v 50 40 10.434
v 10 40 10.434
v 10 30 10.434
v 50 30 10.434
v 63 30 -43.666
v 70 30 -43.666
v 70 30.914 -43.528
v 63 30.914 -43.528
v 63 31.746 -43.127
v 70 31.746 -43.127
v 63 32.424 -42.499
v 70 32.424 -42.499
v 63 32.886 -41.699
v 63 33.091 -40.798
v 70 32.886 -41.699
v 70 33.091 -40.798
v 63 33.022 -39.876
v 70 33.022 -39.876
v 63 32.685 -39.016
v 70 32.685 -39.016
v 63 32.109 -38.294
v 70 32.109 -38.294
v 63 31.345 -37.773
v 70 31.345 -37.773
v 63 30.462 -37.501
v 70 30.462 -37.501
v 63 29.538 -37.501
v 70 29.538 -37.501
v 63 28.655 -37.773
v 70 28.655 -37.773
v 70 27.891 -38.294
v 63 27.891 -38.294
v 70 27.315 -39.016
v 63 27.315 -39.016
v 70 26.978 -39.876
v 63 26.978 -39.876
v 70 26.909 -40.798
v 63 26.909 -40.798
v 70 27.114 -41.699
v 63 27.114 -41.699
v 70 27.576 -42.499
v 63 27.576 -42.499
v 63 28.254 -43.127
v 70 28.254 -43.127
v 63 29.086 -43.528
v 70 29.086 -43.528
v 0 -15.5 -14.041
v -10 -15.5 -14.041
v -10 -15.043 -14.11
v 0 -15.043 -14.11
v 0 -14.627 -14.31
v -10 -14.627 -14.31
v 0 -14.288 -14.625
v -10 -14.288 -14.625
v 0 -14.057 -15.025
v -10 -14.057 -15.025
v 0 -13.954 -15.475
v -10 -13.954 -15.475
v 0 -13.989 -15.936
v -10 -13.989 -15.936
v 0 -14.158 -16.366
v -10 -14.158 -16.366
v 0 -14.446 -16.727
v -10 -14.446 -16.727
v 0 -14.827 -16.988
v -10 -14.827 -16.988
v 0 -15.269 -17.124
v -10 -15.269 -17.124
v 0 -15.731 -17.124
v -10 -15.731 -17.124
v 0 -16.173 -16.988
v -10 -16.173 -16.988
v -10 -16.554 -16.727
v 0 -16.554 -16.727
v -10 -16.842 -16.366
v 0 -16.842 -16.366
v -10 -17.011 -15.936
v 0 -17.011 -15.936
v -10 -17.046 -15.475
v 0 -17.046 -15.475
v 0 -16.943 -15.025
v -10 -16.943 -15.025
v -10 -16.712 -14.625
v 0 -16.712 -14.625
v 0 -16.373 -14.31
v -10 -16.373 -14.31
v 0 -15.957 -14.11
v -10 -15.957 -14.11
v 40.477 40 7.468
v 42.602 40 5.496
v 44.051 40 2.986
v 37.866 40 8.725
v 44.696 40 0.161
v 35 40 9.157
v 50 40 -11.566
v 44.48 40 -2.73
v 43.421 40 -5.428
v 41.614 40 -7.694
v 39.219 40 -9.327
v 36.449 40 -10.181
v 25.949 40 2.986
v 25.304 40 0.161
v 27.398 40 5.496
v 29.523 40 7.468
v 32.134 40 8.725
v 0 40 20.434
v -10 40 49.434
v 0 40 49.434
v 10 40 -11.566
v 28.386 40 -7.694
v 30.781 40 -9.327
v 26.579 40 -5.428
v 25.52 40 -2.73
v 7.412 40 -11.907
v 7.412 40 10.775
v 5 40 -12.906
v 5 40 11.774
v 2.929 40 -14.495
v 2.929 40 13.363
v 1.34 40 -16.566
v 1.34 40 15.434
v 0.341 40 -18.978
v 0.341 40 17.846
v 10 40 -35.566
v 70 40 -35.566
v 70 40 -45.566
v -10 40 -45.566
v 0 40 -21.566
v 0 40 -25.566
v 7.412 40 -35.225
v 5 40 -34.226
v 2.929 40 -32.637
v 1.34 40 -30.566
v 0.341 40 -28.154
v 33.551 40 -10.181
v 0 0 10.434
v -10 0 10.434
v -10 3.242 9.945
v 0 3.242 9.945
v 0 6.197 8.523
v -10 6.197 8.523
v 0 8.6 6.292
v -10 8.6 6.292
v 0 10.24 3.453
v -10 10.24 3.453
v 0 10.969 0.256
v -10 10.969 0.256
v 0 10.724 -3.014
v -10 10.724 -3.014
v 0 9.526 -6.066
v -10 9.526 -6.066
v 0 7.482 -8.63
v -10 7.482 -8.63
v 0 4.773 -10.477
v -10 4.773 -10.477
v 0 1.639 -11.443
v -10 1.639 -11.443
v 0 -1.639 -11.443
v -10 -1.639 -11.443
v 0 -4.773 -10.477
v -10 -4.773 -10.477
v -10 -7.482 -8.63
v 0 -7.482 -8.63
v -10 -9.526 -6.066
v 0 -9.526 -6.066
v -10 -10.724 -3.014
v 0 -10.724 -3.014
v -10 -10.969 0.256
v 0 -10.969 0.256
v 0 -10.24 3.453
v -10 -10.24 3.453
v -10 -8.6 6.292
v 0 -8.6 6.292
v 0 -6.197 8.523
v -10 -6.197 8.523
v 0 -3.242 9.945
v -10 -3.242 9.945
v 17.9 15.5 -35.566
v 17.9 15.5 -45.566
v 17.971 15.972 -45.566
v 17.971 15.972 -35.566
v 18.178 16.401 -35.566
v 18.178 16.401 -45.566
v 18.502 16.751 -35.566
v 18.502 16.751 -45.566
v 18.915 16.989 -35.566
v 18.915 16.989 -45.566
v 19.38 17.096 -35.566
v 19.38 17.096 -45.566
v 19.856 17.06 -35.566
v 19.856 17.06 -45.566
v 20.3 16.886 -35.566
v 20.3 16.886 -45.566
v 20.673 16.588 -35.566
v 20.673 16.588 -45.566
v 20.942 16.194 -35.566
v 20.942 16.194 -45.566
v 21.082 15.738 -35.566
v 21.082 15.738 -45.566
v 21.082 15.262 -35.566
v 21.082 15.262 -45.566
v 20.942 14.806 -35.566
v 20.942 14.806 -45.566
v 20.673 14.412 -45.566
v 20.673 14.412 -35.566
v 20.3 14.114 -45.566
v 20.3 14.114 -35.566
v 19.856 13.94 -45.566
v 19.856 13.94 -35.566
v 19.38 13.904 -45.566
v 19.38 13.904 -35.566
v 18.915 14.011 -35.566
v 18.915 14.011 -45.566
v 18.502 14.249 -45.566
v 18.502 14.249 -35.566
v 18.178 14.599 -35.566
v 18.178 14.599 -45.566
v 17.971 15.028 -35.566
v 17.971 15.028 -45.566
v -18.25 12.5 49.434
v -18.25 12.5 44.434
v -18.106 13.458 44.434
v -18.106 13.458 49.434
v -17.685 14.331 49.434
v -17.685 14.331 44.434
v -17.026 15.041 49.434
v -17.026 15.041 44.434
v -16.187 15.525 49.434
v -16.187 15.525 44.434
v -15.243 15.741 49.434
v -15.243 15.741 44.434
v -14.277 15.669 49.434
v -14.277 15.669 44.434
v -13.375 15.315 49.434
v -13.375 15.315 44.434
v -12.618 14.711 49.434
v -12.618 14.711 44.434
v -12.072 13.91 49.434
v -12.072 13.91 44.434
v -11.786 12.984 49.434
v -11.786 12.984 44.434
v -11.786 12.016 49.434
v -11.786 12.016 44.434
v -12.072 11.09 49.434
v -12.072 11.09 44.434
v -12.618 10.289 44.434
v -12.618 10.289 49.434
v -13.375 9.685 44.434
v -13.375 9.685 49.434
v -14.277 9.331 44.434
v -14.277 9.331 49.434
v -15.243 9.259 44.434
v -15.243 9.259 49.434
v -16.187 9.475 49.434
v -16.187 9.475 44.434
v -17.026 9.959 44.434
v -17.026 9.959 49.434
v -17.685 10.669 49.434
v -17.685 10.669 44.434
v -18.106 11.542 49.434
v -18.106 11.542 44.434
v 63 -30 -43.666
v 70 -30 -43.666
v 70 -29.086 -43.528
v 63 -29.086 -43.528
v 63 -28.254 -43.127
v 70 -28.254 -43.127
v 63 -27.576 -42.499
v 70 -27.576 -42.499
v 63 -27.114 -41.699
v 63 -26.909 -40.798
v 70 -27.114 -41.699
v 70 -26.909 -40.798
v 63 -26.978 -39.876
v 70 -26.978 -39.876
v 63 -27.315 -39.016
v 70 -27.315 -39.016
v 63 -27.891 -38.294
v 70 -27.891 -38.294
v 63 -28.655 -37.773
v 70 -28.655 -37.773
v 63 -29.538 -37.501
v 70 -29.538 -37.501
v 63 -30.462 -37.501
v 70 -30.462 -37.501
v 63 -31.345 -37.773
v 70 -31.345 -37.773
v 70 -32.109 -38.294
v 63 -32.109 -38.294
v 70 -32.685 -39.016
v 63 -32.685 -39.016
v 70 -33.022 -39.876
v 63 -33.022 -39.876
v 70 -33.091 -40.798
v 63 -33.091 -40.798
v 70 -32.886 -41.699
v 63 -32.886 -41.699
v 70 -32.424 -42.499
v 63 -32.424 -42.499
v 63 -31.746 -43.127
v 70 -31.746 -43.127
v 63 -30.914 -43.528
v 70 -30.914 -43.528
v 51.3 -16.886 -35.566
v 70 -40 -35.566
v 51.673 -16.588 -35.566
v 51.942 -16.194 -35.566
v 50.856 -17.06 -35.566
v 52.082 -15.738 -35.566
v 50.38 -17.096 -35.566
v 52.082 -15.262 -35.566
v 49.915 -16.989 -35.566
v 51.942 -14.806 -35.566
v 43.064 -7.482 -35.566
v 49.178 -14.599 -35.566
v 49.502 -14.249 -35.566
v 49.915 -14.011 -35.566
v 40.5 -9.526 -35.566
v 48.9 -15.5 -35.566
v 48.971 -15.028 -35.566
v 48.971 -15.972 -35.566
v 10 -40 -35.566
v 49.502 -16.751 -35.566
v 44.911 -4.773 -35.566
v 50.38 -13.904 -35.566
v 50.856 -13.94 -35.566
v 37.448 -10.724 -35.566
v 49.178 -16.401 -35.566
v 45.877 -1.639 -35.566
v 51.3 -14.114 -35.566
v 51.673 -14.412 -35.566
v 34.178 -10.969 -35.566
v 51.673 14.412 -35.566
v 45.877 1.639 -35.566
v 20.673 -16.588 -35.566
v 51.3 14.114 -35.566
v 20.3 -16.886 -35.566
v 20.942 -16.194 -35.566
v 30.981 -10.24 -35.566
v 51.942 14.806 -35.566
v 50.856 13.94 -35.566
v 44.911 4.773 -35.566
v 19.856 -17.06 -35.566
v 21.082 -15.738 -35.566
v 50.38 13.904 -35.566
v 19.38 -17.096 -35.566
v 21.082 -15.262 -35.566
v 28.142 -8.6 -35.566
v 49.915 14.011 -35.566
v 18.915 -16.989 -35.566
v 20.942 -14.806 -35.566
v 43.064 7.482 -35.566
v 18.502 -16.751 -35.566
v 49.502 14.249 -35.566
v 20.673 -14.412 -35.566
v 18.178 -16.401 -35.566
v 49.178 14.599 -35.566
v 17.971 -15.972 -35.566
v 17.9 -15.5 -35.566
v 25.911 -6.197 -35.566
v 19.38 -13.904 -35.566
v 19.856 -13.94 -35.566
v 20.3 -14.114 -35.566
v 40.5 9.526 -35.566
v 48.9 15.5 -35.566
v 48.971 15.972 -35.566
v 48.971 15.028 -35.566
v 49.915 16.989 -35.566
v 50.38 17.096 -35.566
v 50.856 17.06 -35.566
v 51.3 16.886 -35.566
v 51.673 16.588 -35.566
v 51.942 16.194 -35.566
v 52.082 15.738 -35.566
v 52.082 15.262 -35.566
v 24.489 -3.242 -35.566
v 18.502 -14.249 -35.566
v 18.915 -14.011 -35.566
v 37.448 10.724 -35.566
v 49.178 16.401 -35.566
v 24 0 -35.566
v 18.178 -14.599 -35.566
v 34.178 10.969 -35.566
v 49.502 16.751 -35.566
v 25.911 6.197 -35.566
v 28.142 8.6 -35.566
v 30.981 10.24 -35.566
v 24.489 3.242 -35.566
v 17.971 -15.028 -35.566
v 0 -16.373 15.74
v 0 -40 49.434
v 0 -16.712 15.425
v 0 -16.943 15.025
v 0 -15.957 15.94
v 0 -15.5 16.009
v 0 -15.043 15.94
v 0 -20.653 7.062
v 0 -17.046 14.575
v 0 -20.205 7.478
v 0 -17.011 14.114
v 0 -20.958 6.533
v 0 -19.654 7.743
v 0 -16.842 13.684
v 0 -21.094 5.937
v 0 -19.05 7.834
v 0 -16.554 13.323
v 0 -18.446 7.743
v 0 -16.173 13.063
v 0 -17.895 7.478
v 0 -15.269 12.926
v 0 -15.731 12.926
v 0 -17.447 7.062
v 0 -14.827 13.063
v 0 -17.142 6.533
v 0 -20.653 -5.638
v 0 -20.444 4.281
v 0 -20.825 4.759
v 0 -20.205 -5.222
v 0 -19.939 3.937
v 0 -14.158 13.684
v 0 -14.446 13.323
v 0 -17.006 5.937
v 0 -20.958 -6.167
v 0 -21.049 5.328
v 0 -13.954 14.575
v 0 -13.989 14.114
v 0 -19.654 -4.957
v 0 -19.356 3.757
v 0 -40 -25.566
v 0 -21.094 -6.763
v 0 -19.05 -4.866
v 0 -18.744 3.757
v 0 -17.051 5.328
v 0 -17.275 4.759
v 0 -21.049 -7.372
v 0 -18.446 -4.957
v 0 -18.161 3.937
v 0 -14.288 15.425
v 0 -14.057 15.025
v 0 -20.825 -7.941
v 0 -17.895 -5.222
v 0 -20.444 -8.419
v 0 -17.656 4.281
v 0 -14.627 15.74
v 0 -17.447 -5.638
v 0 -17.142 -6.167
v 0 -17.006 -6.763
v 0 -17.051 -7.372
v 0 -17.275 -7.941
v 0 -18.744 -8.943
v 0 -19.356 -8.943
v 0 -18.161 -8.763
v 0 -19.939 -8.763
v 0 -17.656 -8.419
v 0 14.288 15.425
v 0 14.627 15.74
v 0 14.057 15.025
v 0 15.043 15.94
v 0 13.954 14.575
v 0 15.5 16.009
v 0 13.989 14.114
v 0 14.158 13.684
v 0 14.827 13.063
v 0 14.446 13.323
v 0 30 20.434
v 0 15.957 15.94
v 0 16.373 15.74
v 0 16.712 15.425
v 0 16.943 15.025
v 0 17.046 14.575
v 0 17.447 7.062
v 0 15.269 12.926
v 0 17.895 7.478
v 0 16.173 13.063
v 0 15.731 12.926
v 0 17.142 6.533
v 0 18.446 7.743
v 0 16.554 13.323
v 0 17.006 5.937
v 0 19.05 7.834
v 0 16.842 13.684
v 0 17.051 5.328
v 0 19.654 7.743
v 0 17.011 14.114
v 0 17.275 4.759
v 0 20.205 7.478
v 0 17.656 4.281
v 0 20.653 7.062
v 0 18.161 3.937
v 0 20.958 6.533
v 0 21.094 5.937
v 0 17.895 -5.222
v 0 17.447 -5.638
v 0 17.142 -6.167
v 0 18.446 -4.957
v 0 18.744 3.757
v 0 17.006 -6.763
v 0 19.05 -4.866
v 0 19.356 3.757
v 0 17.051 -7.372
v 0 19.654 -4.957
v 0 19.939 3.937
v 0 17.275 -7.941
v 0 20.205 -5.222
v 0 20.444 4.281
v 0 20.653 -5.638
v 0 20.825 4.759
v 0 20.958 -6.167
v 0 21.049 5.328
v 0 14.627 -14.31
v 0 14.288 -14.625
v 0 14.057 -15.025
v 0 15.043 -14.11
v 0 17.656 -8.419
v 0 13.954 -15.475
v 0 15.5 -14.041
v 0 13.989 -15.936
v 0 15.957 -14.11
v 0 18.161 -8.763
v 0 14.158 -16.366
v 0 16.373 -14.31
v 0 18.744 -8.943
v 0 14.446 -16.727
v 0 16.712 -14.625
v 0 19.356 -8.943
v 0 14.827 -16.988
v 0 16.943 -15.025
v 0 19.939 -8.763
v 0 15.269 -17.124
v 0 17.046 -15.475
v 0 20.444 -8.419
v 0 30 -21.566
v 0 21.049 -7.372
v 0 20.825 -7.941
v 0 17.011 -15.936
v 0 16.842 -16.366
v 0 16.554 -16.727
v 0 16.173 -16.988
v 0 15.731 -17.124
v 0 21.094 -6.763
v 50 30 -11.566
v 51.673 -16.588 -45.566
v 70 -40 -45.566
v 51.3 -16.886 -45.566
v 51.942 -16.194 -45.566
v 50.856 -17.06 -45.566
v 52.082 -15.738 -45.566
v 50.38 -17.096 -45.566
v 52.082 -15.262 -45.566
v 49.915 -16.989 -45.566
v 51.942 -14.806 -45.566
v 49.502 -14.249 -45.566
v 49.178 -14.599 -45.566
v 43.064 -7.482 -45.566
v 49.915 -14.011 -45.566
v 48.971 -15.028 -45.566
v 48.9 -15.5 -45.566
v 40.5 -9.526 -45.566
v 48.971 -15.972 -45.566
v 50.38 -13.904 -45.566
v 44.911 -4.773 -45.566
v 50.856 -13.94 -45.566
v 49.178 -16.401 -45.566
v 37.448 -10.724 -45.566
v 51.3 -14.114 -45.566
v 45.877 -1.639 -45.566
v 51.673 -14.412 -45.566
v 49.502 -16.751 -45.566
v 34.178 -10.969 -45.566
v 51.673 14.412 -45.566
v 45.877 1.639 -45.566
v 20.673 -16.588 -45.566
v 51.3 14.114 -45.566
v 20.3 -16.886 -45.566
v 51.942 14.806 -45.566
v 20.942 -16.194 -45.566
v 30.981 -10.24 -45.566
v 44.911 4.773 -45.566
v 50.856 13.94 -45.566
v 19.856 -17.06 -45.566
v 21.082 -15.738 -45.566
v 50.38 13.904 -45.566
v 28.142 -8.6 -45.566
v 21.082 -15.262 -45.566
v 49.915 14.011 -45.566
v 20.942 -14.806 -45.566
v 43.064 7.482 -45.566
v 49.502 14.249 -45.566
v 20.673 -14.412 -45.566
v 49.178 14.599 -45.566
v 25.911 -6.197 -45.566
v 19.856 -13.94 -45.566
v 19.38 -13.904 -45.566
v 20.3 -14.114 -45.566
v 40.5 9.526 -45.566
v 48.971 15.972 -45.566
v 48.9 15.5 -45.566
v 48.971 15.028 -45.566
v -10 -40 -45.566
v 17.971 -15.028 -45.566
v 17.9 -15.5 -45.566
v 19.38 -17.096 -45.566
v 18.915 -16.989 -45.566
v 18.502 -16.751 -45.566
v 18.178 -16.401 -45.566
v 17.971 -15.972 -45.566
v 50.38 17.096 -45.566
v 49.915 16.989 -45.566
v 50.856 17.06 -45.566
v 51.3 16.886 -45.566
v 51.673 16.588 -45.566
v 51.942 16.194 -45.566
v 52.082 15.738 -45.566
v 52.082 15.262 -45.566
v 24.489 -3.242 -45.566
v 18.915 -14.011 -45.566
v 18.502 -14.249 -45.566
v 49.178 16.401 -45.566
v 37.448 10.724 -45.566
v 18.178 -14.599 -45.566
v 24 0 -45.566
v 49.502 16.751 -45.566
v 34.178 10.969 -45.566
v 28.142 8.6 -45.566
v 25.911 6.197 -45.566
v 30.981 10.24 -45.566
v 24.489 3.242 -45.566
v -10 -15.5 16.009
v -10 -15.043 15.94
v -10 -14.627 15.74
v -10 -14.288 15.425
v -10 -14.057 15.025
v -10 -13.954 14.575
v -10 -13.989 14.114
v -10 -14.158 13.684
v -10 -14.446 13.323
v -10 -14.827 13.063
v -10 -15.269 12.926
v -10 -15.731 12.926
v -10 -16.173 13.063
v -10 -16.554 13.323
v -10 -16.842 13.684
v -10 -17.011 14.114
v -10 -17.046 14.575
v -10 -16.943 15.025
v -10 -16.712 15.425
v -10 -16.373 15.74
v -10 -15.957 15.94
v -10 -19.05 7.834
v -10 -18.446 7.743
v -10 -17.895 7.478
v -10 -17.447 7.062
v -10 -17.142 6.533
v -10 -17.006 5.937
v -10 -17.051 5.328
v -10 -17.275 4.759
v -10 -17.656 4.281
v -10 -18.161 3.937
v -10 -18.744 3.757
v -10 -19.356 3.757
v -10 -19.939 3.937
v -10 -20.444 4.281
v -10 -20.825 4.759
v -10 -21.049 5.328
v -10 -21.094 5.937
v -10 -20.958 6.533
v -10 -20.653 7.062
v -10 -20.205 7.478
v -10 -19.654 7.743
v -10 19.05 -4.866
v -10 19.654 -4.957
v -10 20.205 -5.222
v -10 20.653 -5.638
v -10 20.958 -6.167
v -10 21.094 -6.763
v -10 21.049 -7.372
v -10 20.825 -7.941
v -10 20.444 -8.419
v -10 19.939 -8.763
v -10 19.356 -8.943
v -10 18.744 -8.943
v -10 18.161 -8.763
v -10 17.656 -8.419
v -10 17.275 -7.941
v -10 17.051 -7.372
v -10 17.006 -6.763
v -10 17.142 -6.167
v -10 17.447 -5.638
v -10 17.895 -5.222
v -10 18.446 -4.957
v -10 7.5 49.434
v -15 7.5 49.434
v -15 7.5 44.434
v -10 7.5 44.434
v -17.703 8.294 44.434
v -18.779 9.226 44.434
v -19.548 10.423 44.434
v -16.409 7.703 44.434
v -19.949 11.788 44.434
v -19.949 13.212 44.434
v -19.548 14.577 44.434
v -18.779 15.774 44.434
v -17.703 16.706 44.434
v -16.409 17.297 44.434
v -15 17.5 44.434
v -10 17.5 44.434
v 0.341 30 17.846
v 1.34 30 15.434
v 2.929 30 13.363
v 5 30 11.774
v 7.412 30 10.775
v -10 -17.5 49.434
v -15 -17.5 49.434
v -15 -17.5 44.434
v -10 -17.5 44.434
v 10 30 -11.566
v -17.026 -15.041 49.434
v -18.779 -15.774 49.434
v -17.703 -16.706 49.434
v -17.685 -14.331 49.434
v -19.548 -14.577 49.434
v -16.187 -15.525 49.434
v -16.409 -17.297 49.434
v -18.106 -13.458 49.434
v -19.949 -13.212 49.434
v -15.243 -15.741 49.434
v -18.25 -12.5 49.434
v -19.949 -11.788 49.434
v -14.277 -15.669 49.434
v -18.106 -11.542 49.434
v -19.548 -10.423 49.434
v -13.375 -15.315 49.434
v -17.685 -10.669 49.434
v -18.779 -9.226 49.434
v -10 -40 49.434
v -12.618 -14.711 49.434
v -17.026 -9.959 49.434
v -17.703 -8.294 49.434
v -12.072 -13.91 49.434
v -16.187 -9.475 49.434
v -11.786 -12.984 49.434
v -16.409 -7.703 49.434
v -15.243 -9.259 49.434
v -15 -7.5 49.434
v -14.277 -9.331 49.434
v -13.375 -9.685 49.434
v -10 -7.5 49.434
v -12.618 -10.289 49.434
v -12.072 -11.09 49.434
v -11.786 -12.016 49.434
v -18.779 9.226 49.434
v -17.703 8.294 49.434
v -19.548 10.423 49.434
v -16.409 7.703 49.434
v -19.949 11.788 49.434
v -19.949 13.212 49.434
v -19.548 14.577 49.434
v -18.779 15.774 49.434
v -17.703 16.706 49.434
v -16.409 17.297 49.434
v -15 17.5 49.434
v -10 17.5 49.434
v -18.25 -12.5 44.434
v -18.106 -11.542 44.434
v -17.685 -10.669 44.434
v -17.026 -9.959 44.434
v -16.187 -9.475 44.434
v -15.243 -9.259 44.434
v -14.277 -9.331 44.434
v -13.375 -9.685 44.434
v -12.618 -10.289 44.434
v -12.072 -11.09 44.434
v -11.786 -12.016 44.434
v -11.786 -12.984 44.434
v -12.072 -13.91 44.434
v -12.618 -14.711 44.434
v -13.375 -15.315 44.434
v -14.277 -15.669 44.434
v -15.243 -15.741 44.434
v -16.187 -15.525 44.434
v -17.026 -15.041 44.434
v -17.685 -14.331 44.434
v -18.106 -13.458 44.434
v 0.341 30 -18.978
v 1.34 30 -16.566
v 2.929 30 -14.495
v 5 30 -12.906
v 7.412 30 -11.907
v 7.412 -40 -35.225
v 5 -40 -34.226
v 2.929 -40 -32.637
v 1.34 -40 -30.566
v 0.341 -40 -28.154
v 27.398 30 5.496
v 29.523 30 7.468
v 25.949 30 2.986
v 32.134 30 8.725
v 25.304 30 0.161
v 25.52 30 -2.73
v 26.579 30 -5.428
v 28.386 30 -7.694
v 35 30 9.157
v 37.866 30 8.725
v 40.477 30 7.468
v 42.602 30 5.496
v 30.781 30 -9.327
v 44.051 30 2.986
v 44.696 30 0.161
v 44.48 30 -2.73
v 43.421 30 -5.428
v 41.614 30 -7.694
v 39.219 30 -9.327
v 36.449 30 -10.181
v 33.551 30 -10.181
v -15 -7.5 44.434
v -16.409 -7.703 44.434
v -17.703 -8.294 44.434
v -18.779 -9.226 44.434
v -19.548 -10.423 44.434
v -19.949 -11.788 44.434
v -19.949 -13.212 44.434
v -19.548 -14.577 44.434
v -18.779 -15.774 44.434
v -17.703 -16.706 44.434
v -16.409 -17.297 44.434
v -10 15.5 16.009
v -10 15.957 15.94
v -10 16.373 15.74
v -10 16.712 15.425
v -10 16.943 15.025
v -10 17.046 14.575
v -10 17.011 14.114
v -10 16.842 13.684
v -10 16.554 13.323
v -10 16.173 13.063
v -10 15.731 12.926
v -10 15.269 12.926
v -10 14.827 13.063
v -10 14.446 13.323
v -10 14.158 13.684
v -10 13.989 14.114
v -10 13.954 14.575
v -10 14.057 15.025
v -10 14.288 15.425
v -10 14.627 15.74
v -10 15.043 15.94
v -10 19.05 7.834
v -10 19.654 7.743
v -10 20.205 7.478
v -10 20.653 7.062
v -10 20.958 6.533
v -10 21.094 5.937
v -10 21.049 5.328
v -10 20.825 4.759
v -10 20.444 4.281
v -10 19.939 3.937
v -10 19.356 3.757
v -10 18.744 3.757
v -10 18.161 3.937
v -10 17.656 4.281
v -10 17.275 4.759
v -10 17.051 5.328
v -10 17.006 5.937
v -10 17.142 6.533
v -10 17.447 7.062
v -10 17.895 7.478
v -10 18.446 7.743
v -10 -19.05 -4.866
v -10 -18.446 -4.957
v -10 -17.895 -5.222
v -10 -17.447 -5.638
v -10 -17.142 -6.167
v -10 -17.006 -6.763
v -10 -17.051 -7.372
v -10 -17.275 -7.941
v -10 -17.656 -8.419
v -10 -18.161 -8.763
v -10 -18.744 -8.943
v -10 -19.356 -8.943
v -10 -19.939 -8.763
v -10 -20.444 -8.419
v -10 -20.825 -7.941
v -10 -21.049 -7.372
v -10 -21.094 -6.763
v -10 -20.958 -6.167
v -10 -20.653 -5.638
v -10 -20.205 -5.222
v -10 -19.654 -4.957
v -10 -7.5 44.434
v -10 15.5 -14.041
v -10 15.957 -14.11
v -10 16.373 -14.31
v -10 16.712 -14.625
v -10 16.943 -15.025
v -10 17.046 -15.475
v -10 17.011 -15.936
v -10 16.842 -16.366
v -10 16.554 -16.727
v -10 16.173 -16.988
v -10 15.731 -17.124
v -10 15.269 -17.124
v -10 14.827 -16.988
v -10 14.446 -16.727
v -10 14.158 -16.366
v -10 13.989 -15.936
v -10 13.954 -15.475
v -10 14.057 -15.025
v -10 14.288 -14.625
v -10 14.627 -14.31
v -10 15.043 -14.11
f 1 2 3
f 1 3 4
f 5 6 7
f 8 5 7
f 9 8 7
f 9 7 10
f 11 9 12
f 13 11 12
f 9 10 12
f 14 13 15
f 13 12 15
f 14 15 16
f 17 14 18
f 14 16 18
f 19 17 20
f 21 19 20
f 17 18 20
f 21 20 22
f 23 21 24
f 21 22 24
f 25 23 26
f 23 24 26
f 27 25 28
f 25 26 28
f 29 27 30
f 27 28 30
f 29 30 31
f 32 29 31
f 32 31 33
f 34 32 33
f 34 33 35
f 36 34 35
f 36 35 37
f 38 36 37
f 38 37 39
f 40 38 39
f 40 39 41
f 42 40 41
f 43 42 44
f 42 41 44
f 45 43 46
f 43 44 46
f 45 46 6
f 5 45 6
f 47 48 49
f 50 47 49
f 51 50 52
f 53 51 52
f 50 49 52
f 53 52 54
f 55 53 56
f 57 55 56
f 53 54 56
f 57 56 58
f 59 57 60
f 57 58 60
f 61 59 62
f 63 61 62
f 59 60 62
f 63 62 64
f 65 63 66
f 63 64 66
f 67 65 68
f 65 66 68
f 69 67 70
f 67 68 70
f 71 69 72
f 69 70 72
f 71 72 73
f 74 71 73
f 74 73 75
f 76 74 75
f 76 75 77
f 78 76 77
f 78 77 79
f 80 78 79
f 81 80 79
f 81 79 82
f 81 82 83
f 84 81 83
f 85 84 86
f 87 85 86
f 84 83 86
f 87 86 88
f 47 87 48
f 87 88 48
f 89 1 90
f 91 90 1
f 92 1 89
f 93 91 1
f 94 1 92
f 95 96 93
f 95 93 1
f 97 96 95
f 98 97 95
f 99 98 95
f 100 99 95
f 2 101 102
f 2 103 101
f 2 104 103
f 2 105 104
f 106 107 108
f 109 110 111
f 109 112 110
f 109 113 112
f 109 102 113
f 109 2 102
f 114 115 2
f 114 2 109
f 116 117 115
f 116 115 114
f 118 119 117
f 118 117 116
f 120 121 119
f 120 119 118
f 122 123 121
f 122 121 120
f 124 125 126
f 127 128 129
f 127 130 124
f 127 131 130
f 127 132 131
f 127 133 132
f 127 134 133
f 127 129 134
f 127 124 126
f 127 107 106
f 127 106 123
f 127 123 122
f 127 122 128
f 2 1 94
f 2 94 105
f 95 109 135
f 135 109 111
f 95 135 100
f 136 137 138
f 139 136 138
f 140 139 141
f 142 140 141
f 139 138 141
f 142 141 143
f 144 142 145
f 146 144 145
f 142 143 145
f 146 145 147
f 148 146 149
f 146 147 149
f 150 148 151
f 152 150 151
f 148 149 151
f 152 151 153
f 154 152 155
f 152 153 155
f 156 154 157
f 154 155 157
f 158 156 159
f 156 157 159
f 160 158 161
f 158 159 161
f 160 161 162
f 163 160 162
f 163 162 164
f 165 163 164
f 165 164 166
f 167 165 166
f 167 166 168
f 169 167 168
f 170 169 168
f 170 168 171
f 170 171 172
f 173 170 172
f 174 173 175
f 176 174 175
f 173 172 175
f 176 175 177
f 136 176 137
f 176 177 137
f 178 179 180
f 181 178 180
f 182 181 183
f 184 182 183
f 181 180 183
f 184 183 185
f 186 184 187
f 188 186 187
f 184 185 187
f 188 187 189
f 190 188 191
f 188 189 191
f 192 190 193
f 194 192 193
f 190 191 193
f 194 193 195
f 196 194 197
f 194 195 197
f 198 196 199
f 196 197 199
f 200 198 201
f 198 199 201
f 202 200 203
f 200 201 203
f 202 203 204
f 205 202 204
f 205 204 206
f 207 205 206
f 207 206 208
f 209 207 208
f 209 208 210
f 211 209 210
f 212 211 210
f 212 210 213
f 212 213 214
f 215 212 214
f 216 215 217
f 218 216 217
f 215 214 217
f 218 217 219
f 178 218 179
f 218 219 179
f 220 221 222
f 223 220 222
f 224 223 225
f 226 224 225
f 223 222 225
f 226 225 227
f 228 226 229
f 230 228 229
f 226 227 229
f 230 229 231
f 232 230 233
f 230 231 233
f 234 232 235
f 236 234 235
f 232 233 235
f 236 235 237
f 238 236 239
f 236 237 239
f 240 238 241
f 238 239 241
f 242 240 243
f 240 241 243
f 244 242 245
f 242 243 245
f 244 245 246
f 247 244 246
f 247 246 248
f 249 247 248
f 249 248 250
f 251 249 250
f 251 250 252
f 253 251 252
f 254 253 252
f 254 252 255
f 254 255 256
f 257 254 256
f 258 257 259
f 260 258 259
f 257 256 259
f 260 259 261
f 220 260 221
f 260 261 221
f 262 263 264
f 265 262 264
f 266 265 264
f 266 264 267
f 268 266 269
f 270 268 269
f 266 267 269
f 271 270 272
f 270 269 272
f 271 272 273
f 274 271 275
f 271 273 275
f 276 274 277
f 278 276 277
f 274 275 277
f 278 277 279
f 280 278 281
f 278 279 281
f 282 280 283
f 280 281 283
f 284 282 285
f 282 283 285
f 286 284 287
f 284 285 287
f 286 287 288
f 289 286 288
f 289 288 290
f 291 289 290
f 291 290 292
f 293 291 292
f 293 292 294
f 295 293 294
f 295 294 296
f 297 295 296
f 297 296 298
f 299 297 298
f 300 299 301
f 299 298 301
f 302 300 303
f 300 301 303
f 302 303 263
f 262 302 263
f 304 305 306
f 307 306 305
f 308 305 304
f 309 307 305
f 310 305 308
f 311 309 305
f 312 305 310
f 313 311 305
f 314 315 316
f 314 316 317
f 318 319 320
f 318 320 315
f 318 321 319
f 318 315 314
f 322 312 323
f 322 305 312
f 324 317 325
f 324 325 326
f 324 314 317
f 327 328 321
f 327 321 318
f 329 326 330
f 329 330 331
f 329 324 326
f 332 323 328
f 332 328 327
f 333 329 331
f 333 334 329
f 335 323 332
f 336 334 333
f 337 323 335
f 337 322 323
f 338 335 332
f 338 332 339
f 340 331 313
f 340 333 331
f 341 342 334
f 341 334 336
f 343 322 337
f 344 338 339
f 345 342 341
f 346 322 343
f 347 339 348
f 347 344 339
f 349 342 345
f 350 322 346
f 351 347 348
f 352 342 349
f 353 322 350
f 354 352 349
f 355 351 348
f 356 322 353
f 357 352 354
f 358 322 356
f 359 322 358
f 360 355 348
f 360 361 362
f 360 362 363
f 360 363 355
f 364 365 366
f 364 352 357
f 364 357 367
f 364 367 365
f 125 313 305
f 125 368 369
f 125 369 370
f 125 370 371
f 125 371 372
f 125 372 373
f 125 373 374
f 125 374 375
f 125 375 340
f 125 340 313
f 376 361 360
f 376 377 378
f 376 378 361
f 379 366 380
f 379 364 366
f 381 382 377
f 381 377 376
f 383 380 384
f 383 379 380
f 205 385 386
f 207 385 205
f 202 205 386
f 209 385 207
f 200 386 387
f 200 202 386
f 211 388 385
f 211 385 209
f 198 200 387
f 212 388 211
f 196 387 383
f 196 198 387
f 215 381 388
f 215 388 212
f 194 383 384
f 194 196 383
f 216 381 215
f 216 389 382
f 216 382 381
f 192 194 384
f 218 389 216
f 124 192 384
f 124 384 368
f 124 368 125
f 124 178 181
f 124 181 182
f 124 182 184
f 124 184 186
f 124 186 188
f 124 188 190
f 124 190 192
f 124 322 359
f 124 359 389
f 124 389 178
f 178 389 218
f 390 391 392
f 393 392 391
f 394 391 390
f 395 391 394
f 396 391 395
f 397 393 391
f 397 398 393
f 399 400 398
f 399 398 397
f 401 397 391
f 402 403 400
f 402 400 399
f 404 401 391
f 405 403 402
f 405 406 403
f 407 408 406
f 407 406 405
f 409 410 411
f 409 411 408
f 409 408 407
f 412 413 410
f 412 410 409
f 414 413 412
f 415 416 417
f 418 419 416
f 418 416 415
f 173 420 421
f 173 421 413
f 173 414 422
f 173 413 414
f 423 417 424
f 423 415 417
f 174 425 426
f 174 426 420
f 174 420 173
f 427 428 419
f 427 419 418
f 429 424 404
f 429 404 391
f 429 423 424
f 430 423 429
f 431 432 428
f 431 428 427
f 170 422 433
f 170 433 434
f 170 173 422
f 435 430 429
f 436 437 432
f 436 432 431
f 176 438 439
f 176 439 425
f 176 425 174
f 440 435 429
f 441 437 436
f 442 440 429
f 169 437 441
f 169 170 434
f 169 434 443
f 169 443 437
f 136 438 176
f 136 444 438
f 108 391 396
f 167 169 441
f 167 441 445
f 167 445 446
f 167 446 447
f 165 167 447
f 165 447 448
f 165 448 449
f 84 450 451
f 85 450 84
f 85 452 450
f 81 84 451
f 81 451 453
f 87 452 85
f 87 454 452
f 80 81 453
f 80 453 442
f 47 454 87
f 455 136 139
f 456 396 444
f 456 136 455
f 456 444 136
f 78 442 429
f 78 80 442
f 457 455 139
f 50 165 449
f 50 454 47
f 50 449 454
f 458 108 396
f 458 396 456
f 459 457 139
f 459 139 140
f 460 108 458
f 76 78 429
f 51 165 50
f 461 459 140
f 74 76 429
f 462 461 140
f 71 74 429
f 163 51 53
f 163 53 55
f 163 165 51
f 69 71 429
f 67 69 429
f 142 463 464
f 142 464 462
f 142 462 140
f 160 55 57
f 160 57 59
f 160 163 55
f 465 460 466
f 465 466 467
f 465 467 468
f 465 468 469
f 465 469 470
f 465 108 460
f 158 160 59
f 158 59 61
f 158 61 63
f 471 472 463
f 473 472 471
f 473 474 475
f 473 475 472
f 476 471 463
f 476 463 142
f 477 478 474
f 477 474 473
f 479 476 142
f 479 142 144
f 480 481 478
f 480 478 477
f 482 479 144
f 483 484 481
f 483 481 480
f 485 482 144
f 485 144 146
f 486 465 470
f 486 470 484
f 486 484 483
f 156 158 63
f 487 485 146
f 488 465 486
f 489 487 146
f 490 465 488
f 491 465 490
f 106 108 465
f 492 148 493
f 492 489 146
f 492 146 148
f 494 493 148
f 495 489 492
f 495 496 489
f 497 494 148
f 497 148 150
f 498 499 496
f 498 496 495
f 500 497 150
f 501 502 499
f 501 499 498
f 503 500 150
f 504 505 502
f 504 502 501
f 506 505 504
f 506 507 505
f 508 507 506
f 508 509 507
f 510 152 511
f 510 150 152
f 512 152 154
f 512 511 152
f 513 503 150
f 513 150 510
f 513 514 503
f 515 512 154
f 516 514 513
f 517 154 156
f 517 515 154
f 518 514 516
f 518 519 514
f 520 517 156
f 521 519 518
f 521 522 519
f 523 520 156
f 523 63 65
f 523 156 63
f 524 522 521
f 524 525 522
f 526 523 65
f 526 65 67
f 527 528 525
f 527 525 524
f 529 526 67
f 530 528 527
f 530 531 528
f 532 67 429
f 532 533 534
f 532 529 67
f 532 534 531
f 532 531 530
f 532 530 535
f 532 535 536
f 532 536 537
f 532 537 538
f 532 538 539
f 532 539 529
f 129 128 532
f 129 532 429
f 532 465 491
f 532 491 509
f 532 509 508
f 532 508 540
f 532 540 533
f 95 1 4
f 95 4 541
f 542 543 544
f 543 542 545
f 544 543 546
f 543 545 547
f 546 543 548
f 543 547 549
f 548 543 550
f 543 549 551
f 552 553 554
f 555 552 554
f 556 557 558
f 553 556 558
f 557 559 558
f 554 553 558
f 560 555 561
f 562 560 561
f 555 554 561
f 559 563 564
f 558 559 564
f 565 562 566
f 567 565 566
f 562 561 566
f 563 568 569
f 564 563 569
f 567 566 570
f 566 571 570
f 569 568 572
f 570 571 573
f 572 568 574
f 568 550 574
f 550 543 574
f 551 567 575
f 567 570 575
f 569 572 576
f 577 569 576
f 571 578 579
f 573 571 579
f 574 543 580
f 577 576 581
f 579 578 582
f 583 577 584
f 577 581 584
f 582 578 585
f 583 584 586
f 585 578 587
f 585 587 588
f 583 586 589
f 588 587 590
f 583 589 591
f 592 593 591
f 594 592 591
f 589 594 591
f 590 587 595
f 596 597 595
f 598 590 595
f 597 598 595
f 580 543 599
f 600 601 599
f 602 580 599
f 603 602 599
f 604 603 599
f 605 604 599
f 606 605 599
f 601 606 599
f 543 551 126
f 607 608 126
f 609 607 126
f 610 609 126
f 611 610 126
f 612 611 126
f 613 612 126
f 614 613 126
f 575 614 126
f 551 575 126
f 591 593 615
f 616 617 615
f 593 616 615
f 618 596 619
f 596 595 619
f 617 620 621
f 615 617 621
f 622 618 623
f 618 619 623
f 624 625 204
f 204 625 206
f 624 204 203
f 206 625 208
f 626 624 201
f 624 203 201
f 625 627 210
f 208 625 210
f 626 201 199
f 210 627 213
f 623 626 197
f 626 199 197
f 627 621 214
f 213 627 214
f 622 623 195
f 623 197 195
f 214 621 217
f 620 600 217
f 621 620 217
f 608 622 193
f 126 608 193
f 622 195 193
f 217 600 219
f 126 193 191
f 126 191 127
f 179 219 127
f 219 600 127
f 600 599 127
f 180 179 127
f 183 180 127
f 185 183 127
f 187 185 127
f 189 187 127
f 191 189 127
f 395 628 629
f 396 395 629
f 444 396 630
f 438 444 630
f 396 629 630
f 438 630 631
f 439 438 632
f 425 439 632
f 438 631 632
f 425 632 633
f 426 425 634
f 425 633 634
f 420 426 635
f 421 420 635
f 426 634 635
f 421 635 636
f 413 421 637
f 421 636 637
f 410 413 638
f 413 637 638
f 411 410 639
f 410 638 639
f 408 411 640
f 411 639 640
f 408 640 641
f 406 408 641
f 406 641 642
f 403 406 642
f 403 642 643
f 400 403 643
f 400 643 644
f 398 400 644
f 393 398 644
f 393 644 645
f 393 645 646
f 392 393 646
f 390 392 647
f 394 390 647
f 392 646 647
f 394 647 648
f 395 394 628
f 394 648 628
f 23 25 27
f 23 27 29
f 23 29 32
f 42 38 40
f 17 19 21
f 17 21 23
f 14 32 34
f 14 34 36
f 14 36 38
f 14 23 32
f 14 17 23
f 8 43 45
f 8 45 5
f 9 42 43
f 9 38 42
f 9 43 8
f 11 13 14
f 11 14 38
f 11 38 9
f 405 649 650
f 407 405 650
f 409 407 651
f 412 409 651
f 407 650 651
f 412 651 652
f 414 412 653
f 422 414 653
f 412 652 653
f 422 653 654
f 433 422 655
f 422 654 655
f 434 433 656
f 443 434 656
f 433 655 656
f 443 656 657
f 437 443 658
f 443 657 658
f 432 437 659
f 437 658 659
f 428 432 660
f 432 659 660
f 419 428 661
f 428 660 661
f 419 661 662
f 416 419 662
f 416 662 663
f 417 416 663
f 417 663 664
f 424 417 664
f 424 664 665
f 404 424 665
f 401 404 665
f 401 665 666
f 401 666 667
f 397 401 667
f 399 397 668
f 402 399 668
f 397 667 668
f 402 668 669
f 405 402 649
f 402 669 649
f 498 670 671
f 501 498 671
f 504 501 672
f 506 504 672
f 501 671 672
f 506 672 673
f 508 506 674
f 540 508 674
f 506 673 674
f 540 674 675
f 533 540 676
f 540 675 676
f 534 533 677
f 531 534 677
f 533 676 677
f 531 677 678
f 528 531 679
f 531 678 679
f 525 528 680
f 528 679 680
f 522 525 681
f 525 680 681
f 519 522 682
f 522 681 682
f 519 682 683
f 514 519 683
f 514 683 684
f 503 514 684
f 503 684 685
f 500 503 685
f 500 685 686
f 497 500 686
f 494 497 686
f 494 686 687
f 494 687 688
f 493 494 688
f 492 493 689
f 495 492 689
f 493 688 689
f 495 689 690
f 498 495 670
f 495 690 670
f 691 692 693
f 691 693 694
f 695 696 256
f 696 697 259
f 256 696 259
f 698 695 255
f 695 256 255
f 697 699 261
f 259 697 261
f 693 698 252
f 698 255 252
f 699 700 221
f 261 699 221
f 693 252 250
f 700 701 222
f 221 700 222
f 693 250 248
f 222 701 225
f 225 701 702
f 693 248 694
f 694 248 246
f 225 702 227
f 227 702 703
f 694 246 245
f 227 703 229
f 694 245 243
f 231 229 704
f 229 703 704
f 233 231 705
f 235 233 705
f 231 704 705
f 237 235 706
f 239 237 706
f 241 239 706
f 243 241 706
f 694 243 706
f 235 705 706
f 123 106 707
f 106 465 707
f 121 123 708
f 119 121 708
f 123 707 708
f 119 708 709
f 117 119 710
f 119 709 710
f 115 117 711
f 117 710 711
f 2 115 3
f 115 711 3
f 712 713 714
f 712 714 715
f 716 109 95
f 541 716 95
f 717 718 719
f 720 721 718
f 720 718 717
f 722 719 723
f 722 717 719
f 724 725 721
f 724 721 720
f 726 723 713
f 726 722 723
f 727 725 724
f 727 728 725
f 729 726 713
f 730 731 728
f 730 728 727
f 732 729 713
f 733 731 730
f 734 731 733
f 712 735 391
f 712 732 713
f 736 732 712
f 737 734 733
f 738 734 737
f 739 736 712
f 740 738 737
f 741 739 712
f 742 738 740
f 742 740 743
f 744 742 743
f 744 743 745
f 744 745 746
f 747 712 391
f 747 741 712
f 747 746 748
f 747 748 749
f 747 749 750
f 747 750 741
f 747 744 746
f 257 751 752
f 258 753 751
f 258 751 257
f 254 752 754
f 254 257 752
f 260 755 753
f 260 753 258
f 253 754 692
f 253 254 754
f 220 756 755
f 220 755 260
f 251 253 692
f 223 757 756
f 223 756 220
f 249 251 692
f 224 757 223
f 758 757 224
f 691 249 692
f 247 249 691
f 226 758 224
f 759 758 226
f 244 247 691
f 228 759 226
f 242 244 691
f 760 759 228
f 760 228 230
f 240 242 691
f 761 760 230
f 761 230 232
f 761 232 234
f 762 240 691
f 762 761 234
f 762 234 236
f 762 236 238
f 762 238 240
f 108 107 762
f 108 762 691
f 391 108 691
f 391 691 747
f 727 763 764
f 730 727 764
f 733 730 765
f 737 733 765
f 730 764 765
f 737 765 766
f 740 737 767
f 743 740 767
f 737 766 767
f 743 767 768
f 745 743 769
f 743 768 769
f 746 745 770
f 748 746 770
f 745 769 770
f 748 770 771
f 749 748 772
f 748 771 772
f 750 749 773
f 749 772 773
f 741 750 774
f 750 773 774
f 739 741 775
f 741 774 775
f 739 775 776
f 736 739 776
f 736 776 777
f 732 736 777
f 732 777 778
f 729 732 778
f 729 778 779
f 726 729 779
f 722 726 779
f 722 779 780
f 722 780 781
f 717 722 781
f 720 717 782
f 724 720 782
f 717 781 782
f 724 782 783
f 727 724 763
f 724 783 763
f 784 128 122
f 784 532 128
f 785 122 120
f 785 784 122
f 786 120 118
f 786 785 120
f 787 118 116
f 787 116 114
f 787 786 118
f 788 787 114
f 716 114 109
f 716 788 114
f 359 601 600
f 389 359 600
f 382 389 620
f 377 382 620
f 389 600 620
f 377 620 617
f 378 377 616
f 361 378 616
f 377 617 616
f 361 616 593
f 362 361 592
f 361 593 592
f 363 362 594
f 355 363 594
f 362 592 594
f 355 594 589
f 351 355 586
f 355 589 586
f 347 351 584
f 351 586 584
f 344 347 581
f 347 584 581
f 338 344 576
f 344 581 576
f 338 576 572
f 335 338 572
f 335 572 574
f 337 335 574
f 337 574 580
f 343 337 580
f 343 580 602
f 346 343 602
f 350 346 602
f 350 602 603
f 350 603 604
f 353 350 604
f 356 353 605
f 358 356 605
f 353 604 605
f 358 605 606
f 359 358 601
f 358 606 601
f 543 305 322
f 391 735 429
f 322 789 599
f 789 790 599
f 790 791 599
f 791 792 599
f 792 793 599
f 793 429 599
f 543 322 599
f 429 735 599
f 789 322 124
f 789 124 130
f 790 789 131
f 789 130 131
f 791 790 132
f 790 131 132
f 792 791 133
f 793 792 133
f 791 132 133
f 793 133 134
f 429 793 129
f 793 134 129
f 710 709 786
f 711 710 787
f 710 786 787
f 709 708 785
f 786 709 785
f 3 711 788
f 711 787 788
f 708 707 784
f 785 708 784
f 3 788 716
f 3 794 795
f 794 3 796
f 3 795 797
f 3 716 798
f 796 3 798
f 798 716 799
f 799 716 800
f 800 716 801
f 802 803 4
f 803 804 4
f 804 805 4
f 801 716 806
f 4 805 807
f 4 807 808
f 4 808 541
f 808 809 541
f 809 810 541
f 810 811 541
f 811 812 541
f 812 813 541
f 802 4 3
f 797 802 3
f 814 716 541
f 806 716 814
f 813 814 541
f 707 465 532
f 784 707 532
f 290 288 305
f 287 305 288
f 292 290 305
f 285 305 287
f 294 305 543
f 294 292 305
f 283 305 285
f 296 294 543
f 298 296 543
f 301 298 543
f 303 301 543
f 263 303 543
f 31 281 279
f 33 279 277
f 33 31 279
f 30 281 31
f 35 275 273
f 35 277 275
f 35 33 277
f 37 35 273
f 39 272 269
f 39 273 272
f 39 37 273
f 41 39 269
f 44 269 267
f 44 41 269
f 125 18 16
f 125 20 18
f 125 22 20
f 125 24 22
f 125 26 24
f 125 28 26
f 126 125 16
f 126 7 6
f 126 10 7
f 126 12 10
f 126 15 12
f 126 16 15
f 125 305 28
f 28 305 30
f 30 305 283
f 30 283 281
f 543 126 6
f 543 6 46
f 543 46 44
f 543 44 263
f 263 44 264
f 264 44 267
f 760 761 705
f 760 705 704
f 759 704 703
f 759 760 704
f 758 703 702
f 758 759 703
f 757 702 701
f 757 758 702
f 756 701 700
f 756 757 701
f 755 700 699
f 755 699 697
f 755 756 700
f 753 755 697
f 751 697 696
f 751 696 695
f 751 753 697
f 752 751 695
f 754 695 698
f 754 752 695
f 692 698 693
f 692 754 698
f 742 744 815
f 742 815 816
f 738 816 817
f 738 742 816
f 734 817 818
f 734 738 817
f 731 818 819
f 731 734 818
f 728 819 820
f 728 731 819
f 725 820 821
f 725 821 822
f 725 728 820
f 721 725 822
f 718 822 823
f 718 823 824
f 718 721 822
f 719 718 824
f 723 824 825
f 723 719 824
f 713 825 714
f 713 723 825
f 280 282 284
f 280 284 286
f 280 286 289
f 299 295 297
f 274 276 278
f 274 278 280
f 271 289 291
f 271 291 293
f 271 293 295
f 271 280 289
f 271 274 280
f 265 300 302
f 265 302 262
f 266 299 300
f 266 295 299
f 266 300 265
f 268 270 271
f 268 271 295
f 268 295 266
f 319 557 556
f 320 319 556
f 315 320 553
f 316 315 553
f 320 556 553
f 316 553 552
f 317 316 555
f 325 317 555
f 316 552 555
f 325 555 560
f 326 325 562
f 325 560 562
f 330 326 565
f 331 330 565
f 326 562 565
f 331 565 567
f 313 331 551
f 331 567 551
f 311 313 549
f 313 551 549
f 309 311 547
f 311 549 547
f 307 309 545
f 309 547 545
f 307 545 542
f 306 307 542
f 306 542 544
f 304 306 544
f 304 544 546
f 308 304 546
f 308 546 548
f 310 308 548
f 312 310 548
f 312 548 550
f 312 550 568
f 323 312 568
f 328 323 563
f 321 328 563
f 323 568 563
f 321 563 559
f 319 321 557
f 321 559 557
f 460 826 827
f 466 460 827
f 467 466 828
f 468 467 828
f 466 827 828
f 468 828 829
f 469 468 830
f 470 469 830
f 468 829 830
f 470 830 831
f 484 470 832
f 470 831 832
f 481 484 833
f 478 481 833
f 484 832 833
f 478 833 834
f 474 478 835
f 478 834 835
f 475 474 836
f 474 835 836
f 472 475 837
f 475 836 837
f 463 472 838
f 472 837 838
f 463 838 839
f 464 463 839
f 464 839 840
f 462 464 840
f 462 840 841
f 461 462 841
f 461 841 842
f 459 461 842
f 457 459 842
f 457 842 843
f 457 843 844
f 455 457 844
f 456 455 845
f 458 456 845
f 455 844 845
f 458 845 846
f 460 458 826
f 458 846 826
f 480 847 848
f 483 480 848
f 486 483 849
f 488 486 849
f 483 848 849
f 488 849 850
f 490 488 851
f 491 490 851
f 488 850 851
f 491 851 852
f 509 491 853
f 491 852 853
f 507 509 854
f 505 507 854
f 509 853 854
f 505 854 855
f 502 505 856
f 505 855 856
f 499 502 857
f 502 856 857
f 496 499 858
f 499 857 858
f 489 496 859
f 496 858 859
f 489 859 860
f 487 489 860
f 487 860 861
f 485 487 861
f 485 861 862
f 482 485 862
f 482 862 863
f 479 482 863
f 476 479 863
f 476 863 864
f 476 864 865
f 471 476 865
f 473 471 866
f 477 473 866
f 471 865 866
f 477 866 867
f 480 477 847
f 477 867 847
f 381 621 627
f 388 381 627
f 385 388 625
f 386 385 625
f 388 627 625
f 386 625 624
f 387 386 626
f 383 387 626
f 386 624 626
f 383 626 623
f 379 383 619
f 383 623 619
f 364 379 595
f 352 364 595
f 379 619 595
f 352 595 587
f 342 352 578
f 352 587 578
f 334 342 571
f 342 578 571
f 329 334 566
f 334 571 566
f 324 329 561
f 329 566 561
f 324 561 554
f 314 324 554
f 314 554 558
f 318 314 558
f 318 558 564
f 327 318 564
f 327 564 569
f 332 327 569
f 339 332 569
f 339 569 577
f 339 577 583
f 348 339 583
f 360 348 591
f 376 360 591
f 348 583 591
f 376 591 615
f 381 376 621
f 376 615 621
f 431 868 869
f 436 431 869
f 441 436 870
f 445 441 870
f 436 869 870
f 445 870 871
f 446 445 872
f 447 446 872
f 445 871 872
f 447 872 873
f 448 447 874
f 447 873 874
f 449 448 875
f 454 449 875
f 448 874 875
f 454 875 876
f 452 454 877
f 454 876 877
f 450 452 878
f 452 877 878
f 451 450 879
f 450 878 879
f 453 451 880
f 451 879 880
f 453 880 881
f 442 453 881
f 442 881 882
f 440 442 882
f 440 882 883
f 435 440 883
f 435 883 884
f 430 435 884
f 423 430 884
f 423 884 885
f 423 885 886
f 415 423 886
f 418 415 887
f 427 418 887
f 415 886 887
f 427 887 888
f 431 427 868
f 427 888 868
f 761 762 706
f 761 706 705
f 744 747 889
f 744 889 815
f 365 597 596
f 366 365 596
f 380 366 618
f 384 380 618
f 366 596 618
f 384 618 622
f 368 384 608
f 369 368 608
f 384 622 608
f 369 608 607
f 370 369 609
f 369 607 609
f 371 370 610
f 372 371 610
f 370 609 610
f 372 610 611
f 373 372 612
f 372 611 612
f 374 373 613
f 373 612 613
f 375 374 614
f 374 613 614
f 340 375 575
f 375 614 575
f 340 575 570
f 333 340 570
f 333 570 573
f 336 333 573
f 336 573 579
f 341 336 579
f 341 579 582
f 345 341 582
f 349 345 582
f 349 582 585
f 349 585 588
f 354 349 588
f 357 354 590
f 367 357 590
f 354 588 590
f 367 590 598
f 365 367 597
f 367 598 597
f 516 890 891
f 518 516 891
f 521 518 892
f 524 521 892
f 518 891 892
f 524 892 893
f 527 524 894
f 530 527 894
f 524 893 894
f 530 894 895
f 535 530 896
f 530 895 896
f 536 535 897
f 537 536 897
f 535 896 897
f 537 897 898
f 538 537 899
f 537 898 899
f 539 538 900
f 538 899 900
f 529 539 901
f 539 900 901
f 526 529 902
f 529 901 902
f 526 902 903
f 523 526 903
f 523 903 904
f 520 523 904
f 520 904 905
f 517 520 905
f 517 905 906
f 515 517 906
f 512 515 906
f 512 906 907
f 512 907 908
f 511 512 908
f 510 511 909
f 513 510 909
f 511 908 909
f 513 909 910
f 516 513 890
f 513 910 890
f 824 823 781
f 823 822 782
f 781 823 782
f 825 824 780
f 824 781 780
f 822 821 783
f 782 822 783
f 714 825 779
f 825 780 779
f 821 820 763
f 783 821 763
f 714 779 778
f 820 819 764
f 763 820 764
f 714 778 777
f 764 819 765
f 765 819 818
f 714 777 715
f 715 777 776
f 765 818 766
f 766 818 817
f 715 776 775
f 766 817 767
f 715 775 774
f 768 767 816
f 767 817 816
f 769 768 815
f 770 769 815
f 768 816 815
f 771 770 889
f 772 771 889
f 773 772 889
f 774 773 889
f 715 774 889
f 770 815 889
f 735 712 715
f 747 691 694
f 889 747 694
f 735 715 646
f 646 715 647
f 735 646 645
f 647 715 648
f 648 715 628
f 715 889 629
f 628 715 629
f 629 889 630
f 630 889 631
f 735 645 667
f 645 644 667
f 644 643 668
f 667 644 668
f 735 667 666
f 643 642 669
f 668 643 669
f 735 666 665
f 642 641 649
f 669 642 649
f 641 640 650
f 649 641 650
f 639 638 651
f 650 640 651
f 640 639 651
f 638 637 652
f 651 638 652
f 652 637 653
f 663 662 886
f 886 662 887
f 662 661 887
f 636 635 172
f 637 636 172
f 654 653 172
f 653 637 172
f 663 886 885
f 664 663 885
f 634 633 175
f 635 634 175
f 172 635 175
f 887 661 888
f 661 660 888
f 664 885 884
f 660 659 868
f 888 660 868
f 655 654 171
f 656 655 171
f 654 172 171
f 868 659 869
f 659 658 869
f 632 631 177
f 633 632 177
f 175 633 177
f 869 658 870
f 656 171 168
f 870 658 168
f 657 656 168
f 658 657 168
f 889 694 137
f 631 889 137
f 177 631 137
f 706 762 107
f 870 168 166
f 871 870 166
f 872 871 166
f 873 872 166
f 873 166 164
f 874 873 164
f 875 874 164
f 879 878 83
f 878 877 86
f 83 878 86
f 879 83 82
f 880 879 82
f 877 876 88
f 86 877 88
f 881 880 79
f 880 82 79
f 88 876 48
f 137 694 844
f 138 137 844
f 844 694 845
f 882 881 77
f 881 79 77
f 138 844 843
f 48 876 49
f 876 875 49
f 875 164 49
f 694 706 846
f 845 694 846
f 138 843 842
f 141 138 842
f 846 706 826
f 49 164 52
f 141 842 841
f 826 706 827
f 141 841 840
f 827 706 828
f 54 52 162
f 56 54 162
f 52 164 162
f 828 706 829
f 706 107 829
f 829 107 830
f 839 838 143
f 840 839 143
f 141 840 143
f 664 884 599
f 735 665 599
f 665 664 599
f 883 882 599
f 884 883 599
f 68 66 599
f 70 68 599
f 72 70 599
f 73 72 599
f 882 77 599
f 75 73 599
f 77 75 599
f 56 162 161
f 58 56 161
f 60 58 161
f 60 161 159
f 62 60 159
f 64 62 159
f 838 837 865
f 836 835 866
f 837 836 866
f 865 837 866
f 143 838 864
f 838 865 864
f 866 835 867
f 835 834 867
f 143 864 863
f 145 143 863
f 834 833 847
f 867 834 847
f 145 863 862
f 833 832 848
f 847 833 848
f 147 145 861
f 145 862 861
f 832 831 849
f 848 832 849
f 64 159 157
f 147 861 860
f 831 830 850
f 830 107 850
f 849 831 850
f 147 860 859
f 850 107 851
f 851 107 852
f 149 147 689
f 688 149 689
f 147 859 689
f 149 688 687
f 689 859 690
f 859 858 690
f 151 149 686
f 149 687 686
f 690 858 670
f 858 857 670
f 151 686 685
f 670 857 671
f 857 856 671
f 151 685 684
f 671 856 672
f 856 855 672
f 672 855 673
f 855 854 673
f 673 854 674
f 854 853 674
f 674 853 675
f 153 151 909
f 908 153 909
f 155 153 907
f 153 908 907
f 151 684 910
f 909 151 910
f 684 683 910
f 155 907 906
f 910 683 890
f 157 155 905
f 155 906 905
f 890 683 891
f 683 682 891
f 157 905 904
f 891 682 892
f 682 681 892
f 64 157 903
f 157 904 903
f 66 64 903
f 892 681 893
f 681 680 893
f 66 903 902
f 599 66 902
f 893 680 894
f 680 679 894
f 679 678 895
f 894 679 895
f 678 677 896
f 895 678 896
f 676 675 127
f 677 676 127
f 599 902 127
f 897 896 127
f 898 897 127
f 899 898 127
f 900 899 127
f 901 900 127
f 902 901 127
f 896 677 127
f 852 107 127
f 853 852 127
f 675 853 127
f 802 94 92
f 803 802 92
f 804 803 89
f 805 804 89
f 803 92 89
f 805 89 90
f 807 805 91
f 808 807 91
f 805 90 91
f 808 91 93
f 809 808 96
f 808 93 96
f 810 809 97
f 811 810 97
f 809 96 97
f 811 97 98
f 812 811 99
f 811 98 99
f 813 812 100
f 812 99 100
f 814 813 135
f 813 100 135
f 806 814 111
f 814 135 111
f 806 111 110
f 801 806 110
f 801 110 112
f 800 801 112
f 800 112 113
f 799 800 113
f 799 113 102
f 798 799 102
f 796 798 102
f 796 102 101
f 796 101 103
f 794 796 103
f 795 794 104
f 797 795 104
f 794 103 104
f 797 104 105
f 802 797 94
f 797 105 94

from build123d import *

# Parameters (mm, degrees)
SKETCH1_W               = 10
SKETCH1_H               = 95
BOSS_EXTRUDE1_DEPTH     = 40
SKETCH4_W               = 10
SKETCH4_H               = 80
BOSS_EXTRUDE3_DEPTH     = 70
SKETCH10_R              = 11
SKETCH10_R_2            = 1.6
CUT_EXTRUDE1_DEPTH      = 10
SKETCH2_R               = 11
SKETCH2_R_2             = 1.55
SKETCH2_R_3             = 2.05
CUT_EXTRUDE2_DEPTH      = 10
BOSS_EXTRUDE4_DEPTH     = 5
SKETCH15_R              = 3.25
CUT_EXTRUDE3_DEPTH      = 5
CROQUIS1_W              = 50
CROQUIS1_H              = 22
CROQUIS1_R              = 9.72345
SALIENTE_EXTRUIR1_DEPTH = 10
CROQUIS2_R              = 3.1
CORTAR_EXTRUIR1_DEPTH   = 7
REDONDEO1_R             = 10


with BuildPart() as part:
    # Sketch1 → Boss-Extrude1 (new, symmetric)
    with BuildSketch(Plane(origin=(0, 0, 0), x_dir=(1, 0, 0), z_dir=(0, 1, 0))):
        with Locations((-5, -1.933942264)):
            Rectangle(SKETCH1_W, SKETCH1_H)
    extrude(amount=BOSS_EXTRUDE1_DEPTH, both=True)

    # Sketch4 → Boss-Extrude3 (add)
    with BuildSketch(Plane(origin=(0, 0, 0), x_dir=(0, 0, -1), z_dir=(1, 0, 0))):
        with Locations((40.566057736, 0)):
            Rectangle(SKETCH4_W, SKETCH4_H)
    extrude(amount=BOSS_EXTRUDE3_DEPTH)

    # Sketch10 → Cut-Extrude1 (cut)
    with BuildSketch(Plane(origin=(0, 0, -45.566057736), x_dir=(-1, 0, 0), z_dir=(0, 0, -1))):
        with Locations((-35, 0)):
            Circle(SKETCH10_R)
        with Locations((-19.5, 15.5)):
            Circle(SKETCH10_R_2)
        with Locations((-50.5, 15.5)):
            Circle(SKETCH10_R_2)
        with Locations((-19.5, -15.5)):
            Circle(SKETCH10_R_2)
        with Locations((-50.5, -15.5)):
            Circle(SKETCH10_R_2)
    extrude(amount=-CUT_EXTRUDE1_DEPTH, mode=Mode.SUBTRACT)

    # Sketch2 → Cut-Extrude2 (cut)
    with BuildSketch(Plane.ZY.offset(10)):
        with Locations((-0.566057736, 0)):
            Circle(SKETCH2_R)
        with Locations((-15.591169934, -15.5)):
            Circle(SKETCH2_R_2)
        with Locations((-6.916057736, -19.05)):
            Circle(SKETCH2_R_3)
        with Locations((-15.591169934, 15.5)):
            Circle(SKETCH2_R_2)
        with Locations((-6.916057736, 19.05)):
            Circle(SKETCH2_R_3)
        with Locations((5.783942264, 19.05)):
            Circle(SKETCH2_R_3)
        with Locations((14.459054462, 15.5)):
            Circle(SKETCH2_R_2)
        with Locations((14.459054462, -15.5)):
            Circle(SKETCH2_R_2)
        with Locations((5.783942264, -19.05)):
            Circle(SKETCH2_R_3)
    extrude(amount=-CUT_EXTRUDE2_DEPTH, mode=Mode.SUBTRACT)

    # Sketch14 → Boss-Extrude4 (add)
    with BuildSketch(Plane.XY.offset(49.433942264)):
        with BuildLine():
            Line((-15, -17.5), (-10, -17.5))
            Line((-10, -17.5), (-10, -7.5))
            Line((-10, -7.5), (-15, -7.5))
            ThreePointArc((-15, -7.5), (-20, -12.5), (-15, -17.5))
        make_face()
        with BuildLine():
            Line((-15, 7.5), (-10, 7.5))
            Line((-10, 7.5), (-10, 17.5))
            Line((-10, 17.5), (-15, 17.5))
            ThreePointArc((-15, 17.5), (-20, 12.5), (-15, 7.5))
        make_face()
    extrude(amount=-BOSS_EXTRUDE4_DEPTH)

    # Sketch15 → Cut-Extrude3 (cut)
    with BuildSketch(Plane(origin=(0, 0, 44.433942264), x_dir=(-1, 0, 0), z_dir=(0, 0, -1))):
        with Locations((15, -12.5)):
            Circle(SKETCH15_R)
        with Locations((15, 12.5)):
            Circle(SKETCH15_R)
    extrude(amount=-CUT_EXTRUDE3_DEPTH, mode=Mode.SUBTRACT)

    # Croquis1 → Saliente-Extruir1 (add)
    with BuildSketch(Plane(origin=(0, 40, 0), x_dir=(1, 0, 0), z_dir=(0, 1, 0))):
        with Locations((25, 0.566057736)):
            Rectangle(CROQUIS1_W, CROQUIS1_H)
        with Locations(Location((35, 0.566057736, 0), (0, 0, 270))):
            Circle(CROQUIS1_R, mode=Mode.SUBTRACT)
    extrude(amount=-SALIENTE_EXTRUIR1_DEPTH)

    # Croquis2 → Cortar-Extruir1 (cut)
    with BuildSketch(Plane(origin=(70, 0, 0), x_dir=(0, 0, -1), z_dir=(1, 0, 0))):
        with Locations((40.566057736, 30)):
            Circle(CROQUIS2_R)
        with Locations((40.566057736, -30)):
            Circle(CROQUIS2_R)
    extrude(amount=-CORTAR_EXTRUIR1_DEPTH, mode=Mode.SUBTRACT)

    # Redondeo1
    redondeo1_edges = [part.edges().sort_by_distance(p)[0] for p in [
        (0, 0, -35.566057736),
        (0, 35, -11.566057736),
        (0, 35, 10.433942264),
    ]]
    fillet(redondeo1_edges, radius=REDONDEO1_R)


solid = part.part
